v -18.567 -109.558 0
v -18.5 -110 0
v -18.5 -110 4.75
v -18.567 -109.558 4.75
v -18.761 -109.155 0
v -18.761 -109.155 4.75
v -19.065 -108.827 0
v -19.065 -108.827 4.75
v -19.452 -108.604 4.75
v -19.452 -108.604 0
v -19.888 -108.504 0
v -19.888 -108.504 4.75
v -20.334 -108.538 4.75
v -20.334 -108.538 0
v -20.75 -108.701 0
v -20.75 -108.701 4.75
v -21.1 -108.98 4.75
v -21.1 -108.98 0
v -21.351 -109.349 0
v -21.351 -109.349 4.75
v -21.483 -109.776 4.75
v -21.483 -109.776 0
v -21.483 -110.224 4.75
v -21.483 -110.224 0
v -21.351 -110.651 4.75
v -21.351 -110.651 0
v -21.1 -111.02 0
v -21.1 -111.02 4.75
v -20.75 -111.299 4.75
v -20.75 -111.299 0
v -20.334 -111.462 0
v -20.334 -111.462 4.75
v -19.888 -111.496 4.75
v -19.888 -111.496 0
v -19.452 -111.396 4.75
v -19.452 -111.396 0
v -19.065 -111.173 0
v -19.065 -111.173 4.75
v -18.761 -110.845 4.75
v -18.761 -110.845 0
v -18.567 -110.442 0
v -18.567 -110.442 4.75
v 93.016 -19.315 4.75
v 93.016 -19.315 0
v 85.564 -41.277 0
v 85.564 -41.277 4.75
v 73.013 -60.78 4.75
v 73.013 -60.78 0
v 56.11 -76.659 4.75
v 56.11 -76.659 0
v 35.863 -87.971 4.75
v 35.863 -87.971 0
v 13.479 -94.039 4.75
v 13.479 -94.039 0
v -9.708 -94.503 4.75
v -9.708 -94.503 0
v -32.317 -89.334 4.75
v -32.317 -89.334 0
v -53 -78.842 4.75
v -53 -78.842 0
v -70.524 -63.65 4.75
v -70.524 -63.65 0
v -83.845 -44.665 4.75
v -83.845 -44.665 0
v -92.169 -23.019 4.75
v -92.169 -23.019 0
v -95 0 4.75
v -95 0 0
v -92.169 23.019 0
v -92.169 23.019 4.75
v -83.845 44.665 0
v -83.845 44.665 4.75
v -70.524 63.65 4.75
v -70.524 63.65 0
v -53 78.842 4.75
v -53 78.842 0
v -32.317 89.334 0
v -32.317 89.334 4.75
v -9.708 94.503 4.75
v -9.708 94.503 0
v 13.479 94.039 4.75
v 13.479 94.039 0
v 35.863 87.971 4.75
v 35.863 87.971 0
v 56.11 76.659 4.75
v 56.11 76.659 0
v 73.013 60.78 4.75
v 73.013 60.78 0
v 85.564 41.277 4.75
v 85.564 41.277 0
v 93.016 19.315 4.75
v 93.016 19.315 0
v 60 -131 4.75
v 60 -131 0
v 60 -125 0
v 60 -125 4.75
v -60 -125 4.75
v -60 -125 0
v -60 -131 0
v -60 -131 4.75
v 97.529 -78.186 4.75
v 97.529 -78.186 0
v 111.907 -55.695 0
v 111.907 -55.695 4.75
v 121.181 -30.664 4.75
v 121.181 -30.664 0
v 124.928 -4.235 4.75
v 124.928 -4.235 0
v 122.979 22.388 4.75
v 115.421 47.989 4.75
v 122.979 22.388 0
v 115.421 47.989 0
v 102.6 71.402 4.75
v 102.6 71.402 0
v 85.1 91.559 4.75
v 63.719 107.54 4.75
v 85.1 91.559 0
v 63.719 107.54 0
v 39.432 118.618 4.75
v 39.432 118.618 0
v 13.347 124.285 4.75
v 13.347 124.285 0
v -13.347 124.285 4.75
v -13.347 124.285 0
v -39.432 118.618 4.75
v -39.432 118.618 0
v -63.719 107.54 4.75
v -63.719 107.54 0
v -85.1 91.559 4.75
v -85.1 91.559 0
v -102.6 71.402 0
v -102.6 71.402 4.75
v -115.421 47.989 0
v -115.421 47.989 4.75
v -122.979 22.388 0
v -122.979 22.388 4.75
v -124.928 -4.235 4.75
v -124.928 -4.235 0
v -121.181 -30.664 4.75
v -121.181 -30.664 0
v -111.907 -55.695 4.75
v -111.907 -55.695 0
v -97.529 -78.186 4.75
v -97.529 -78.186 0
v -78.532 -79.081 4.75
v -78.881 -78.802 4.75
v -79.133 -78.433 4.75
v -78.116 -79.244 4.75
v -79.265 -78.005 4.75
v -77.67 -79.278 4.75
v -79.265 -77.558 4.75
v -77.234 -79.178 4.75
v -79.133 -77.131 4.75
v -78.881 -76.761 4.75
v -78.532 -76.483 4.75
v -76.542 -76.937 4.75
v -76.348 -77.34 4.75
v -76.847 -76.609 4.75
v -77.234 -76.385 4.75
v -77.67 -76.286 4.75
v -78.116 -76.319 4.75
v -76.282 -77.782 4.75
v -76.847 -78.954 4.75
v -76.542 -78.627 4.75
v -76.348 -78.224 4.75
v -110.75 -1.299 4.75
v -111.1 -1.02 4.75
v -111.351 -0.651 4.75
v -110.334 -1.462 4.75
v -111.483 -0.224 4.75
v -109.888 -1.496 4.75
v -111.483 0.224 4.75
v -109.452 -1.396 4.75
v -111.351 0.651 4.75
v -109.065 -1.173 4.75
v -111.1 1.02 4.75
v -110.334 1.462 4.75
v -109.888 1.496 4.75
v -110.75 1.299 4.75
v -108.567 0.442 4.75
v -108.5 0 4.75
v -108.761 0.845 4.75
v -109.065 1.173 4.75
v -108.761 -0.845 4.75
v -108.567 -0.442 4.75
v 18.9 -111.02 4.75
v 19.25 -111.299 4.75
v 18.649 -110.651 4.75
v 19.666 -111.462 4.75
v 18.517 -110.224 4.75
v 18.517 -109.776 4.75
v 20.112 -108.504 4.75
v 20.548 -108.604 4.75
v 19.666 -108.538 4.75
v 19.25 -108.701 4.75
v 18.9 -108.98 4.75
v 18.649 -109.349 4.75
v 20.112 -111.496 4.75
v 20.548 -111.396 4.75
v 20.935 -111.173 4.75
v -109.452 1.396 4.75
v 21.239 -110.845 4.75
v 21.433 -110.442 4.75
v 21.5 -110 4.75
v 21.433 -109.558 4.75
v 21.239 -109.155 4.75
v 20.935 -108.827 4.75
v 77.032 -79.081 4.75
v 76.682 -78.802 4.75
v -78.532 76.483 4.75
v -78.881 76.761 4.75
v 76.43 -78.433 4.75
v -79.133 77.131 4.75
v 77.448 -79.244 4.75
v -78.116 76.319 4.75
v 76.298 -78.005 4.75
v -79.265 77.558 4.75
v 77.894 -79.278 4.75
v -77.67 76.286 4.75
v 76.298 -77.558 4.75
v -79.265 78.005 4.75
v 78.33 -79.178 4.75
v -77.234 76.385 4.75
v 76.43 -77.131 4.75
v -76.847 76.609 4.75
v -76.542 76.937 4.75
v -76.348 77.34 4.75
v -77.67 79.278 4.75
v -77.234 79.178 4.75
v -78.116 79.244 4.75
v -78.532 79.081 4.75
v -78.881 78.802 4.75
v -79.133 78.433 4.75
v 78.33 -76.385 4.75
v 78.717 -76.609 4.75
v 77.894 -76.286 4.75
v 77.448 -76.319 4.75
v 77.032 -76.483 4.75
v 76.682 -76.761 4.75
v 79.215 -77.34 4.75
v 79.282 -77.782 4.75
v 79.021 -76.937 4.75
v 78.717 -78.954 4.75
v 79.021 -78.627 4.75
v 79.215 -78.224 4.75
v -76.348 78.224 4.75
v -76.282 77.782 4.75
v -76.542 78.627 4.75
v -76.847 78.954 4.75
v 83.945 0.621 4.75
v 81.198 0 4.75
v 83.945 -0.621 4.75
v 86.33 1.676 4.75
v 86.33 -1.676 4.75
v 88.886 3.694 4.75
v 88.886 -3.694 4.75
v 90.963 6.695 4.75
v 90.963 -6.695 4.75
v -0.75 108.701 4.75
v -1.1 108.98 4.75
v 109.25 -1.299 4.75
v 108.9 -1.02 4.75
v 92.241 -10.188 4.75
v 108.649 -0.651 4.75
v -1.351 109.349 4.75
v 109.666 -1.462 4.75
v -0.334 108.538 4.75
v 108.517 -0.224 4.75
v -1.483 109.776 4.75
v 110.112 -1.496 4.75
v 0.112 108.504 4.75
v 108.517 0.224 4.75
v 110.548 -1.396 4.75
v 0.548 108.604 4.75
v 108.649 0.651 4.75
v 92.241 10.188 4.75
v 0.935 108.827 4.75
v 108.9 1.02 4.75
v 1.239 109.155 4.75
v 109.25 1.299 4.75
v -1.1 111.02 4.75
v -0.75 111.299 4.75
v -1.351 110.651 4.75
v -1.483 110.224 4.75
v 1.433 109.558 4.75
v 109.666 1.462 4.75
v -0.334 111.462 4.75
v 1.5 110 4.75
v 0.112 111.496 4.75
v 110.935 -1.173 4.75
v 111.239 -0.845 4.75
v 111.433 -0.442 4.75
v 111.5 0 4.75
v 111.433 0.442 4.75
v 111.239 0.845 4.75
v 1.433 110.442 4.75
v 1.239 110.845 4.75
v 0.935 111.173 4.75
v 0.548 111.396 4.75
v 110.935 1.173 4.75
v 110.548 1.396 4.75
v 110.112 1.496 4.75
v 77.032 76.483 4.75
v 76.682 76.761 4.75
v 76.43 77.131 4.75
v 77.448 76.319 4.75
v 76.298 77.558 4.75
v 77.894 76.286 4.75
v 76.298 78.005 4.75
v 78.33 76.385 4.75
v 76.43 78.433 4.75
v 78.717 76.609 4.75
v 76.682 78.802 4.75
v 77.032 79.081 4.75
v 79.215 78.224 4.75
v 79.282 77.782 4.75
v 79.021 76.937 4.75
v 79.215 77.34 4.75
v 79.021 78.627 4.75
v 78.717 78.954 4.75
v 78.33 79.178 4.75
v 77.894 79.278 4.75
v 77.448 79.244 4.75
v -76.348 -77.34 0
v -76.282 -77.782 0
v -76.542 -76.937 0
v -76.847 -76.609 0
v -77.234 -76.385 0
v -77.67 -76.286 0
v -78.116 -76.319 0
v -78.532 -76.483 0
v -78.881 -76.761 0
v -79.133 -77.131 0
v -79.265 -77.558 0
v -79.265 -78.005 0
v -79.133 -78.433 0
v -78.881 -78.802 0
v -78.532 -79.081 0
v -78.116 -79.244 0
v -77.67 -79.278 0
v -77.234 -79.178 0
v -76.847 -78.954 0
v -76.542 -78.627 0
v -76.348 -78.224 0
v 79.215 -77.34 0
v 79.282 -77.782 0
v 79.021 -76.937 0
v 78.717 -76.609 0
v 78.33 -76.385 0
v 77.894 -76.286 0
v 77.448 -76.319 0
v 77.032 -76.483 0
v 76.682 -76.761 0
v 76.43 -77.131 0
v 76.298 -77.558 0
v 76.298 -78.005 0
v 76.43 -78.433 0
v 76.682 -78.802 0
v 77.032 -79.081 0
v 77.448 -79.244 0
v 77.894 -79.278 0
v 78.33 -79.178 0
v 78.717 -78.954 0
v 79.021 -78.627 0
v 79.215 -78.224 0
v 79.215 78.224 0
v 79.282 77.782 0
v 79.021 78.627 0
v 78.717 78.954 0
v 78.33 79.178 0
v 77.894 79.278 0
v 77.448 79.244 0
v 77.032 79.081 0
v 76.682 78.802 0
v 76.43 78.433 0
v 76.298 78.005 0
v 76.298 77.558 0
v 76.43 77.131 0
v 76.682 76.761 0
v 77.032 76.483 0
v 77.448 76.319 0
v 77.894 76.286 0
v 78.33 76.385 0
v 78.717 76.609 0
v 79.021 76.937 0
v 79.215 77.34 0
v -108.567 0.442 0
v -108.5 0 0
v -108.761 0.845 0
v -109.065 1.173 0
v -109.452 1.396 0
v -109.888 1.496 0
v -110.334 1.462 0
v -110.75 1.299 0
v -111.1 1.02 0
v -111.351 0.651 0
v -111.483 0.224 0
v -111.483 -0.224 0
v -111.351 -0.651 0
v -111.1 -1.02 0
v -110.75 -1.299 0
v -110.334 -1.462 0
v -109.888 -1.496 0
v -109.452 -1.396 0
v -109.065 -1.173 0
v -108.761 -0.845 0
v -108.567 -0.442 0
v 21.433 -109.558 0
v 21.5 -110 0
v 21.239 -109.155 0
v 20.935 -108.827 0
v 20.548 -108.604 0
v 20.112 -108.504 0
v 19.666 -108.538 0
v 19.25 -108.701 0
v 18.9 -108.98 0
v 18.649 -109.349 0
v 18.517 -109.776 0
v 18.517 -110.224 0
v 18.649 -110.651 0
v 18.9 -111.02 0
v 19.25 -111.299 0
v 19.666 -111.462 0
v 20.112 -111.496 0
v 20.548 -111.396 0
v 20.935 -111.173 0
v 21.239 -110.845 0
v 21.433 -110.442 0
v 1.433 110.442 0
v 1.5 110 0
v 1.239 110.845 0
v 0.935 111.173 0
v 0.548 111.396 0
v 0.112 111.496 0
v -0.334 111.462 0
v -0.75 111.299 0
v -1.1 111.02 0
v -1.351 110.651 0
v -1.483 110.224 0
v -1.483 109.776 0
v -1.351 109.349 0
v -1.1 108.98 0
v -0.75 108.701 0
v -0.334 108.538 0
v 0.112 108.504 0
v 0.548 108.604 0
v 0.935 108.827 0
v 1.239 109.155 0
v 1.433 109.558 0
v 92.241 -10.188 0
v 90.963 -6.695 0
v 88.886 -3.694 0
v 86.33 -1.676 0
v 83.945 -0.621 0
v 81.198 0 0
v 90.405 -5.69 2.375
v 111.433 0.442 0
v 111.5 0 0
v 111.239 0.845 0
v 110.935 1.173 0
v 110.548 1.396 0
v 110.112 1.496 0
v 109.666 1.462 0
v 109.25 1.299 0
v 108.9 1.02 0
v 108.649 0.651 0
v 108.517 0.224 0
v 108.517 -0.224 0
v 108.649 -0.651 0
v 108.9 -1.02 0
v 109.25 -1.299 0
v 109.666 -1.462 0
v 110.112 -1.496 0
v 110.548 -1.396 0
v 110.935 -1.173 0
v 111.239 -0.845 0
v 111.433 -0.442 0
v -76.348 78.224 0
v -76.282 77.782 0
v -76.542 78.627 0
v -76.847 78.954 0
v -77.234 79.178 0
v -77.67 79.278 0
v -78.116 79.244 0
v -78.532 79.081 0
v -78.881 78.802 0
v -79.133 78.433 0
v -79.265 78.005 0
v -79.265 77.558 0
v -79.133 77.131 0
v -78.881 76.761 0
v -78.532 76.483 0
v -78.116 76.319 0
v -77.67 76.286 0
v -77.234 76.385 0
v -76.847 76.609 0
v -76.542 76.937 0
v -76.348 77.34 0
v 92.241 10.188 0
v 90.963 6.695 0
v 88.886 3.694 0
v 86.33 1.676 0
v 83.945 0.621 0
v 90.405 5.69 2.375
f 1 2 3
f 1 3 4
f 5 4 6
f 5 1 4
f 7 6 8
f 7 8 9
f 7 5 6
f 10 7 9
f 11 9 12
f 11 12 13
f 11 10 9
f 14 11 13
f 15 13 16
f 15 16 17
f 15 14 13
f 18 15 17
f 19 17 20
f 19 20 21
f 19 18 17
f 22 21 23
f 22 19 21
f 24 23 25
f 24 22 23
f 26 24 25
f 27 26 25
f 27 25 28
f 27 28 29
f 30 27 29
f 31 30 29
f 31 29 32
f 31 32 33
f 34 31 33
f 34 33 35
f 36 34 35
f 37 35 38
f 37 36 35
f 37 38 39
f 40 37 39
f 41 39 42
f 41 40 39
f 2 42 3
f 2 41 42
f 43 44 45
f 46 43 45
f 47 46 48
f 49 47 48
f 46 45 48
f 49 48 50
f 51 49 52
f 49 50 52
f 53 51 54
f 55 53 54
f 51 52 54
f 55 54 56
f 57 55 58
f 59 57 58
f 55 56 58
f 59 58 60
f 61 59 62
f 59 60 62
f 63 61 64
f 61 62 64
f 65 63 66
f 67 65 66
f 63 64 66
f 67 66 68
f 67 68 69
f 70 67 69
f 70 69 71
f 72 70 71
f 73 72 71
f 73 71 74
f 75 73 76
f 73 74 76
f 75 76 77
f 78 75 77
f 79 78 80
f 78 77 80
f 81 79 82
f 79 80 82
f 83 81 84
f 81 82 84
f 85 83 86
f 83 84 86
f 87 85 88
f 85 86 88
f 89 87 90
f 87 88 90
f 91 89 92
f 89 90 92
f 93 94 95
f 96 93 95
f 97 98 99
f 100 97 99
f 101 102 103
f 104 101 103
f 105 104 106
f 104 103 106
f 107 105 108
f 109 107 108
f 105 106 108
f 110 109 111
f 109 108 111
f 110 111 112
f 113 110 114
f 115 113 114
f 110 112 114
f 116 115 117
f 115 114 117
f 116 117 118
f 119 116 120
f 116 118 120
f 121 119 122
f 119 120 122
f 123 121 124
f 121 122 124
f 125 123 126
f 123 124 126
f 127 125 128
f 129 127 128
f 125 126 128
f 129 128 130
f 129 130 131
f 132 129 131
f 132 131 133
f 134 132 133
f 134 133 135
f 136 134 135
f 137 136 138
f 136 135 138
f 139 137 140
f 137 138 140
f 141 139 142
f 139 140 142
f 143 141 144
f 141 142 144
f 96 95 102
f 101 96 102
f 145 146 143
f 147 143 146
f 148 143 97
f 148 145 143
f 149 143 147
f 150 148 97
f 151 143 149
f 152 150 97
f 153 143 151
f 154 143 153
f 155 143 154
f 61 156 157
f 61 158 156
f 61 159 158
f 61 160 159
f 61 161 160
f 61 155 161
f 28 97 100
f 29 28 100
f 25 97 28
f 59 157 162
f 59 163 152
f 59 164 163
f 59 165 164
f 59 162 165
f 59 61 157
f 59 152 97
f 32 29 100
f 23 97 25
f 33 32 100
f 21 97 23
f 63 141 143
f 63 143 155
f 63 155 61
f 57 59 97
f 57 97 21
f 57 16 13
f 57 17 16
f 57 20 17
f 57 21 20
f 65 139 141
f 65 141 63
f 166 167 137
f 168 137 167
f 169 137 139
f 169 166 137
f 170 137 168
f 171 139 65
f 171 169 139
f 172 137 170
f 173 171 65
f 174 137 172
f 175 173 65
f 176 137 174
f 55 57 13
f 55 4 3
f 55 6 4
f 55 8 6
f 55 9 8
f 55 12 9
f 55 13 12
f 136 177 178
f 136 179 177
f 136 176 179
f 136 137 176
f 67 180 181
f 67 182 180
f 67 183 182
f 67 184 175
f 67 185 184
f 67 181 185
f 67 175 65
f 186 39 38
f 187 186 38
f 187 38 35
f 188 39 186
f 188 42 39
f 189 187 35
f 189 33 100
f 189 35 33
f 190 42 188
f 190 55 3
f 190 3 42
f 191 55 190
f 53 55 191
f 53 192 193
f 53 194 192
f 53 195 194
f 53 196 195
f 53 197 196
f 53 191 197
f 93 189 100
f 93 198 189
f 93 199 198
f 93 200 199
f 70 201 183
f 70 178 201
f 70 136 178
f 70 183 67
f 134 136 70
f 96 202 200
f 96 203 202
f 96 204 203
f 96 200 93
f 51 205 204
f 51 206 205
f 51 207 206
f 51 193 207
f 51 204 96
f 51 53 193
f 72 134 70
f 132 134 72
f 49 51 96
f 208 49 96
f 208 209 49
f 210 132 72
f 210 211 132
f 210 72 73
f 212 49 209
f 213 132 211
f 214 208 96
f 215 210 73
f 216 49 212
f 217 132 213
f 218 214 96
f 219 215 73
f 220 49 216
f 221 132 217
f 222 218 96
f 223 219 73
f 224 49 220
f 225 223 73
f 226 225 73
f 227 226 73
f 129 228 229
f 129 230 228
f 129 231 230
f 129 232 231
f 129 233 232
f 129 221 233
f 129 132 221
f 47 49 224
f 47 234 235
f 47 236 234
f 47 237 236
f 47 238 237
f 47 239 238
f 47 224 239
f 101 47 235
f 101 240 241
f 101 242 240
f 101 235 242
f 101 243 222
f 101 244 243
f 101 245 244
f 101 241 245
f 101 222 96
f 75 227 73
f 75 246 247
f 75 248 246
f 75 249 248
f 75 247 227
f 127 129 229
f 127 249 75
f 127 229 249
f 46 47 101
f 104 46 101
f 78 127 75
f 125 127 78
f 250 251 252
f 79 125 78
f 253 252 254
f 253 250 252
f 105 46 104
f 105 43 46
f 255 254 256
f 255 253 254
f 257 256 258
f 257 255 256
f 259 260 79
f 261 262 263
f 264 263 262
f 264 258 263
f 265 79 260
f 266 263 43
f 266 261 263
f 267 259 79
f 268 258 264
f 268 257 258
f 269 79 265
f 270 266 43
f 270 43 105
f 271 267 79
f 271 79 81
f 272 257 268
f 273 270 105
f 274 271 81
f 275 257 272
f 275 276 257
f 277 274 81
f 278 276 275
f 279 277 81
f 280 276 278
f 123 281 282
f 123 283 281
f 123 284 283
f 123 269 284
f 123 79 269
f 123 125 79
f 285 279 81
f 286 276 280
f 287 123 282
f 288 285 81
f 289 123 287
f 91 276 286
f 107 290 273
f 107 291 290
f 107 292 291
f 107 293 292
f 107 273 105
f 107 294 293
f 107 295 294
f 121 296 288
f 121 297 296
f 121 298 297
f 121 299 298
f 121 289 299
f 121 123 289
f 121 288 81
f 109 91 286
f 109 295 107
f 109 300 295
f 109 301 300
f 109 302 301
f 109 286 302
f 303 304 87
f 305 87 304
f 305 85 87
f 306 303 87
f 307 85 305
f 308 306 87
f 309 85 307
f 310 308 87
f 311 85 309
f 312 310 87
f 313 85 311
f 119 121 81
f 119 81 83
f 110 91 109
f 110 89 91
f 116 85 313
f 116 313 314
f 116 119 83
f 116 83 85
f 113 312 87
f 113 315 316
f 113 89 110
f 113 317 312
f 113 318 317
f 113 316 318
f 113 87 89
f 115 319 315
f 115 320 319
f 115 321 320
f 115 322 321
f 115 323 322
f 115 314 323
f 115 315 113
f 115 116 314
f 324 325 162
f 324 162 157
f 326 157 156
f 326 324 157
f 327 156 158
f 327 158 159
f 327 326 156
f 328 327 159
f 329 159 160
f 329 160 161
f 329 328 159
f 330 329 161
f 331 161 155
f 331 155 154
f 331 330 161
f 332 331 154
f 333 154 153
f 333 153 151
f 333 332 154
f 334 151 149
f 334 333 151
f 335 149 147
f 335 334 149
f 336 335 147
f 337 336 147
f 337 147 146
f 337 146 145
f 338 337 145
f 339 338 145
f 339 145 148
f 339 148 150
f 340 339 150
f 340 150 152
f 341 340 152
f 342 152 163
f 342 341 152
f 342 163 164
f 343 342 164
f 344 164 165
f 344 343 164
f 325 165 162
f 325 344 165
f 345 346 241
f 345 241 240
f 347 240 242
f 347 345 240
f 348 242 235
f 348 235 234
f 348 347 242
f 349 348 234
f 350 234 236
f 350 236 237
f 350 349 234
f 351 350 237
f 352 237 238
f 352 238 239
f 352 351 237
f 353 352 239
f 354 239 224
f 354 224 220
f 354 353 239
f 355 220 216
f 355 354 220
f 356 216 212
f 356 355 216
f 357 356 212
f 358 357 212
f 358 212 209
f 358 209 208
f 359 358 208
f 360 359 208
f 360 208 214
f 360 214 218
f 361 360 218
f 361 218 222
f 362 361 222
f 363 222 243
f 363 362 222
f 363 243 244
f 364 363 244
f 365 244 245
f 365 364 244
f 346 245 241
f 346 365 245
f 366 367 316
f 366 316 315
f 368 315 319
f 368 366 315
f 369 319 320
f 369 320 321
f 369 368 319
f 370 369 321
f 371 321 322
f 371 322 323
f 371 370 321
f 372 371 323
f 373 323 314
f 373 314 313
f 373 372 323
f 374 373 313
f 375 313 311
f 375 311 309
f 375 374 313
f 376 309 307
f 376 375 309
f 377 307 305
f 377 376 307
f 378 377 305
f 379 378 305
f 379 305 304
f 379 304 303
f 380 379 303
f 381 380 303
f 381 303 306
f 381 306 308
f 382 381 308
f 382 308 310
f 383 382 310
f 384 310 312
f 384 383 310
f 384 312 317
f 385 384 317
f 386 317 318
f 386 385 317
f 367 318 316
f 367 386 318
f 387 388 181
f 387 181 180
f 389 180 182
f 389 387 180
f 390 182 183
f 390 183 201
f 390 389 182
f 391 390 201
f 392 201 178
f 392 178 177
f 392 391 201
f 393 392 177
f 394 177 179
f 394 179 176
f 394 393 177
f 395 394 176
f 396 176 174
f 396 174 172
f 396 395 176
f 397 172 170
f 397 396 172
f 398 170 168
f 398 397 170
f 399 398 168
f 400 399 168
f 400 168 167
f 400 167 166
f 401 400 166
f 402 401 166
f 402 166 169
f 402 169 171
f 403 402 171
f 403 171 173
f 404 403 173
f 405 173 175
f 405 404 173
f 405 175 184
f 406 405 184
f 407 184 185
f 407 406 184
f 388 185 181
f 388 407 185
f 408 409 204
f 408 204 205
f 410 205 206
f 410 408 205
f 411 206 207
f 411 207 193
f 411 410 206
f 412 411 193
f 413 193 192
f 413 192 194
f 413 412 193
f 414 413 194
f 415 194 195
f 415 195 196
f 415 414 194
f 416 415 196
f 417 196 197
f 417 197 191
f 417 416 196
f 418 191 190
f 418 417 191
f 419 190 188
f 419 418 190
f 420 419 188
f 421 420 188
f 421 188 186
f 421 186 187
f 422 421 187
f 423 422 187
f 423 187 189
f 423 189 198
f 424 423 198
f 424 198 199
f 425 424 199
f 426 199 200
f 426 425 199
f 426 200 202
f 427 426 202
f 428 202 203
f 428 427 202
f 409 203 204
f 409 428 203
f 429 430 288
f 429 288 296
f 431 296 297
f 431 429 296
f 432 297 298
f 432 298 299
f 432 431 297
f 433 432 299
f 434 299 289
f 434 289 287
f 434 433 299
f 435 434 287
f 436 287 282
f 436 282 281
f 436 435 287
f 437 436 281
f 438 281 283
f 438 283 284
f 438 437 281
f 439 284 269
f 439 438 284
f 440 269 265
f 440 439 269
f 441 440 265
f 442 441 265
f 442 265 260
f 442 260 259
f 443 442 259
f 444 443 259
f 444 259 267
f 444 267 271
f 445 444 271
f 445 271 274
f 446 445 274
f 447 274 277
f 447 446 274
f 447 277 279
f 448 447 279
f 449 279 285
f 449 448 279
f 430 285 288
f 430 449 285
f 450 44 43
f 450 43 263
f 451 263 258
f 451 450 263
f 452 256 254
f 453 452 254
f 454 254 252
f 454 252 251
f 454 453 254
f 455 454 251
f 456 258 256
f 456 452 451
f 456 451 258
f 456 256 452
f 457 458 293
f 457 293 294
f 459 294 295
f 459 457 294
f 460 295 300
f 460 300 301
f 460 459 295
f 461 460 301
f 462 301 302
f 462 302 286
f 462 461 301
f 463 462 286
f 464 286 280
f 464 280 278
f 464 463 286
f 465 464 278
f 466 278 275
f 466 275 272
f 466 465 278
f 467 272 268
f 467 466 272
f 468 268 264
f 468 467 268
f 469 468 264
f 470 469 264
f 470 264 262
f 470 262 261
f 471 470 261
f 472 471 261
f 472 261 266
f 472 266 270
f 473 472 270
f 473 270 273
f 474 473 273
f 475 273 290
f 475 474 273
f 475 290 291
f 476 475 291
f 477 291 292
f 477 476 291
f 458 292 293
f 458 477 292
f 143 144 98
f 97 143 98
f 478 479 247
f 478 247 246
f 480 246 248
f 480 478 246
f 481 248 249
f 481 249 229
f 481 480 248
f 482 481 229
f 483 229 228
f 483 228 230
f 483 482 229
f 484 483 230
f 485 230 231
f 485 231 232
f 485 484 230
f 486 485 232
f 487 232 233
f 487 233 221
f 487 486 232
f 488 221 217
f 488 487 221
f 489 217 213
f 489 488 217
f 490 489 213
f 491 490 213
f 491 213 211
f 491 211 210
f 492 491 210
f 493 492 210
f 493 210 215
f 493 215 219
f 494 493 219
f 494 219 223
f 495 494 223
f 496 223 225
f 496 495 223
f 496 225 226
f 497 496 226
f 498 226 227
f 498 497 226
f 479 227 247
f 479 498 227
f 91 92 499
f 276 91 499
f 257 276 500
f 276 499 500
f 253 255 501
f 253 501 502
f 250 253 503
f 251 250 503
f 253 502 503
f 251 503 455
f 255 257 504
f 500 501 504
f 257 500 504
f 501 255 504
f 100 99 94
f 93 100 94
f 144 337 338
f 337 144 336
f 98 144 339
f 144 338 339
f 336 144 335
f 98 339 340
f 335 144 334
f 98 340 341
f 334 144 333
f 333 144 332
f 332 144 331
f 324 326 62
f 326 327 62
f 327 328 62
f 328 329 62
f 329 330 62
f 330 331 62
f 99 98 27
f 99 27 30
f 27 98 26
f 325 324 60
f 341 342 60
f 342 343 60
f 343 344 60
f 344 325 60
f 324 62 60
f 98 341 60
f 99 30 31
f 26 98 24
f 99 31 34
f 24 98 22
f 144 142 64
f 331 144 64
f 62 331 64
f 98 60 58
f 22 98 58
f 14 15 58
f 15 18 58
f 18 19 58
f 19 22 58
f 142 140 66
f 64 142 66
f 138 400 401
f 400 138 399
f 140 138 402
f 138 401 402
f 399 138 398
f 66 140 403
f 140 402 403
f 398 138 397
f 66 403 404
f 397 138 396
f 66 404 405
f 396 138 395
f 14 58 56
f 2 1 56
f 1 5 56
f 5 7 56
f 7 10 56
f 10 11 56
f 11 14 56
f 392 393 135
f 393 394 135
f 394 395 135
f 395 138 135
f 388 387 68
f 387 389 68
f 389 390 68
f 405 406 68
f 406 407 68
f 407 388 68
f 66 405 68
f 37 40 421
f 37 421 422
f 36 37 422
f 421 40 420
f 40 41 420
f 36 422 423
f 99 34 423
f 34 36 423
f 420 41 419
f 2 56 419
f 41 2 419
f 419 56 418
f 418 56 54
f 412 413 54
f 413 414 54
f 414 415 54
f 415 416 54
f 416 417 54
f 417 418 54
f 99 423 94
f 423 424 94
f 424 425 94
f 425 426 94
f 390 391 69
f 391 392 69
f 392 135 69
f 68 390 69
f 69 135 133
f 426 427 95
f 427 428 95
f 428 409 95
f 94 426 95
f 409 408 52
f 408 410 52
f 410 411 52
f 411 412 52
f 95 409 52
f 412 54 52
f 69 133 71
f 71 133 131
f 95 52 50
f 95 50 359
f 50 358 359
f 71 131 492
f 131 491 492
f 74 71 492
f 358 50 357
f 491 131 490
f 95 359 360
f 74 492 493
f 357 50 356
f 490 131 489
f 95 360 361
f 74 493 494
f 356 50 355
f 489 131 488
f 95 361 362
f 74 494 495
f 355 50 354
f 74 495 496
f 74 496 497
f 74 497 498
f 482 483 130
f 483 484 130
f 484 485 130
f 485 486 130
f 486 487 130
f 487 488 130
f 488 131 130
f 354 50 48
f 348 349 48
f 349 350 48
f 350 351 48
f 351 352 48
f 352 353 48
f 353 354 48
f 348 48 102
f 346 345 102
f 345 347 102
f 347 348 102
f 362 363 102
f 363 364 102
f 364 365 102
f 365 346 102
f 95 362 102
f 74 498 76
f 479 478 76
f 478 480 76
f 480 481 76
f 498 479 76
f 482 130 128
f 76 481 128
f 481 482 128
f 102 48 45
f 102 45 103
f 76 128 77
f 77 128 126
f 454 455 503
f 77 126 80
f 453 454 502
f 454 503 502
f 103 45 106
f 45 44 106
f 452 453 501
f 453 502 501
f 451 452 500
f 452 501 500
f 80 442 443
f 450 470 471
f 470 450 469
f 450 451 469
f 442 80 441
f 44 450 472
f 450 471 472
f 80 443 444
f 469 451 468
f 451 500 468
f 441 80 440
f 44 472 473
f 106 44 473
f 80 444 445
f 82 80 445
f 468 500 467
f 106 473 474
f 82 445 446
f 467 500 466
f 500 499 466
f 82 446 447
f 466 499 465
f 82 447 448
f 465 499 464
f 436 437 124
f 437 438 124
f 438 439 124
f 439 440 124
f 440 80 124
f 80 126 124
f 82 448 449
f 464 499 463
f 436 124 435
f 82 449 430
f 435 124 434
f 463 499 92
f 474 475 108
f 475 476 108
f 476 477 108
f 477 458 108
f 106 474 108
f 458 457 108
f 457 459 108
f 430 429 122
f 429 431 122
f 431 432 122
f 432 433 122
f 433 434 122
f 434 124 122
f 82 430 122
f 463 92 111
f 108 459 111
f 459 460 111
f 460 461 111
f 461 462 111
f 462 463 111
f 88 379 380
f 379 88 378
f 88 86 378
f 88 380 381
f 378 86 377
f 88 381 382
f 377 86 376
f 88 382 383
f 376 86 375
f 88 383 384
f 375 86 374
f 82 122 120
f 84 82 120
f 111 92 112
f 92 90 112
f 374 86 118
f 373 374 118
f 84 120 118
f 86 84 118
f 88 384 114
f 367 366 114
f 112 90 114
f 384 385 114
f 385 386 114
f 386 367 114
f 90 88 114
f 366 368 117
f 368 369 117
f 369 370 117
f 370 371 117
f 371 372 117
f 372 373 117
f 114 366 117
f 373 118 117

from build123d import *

# Parameters (mm, degrees)
SKETCH1_R           = 1.5
BOSS_EXTRUDE1_DEPTH = 4.75


with BuildPart() as part:
    # Sketch1 → Boss-Extrude1 (new body)
    with BuildSketch(Plane.XY):
        with BuildLine():
            Line((-97.529258778, -78.185955787), (-60, -125))
            Line((-60, -125), (-60, -131))
            Line((-60, -131), (60, -131))
            Line((60, -131), (60, -125))
            Line((60, -125), (97.529258778, -78.185955787))
            ThreePointArc((97.529258778, -78.185955787), (0, 125), (-97.529258778, -78.185955787))
        make_face()
        with Locations((-77.781745931, -77.781745931)):
            Circle(SKETCH1_R, mode=Mode.SUBTRACT)
        with Locations((-20, -110)):
            Circle(SKETCH1_R, mode=Mode.SUBTRACT)
        with Locations((20, -110)):
            Circle(SKETCH1_R, mode=Mode.SUBTRACT)
        with Locations((77.781745931, -77.781745931)):
            Circle(SKETCH1_R, mode=Mode.SUBTRACT)
        with Locations((-110, 0)):
            Circle(SKETCH1_R, mode=Mode.SUBTRACT)
        with BuildLine():
            ThreePointArc((93.01577046, -19.314928054), (-95, 0), (93.01577046, 19.314928054))
            add(Edge.make_bspline(
                [(93.01577046, 19.314928054), (93.70285757, 1.722452045), (81.198007465, 0)],
                knots=[0, 0, 0, 1, 1, 1], degree=2))
            add(Edge.make_bspline(
                [(93.01577046, -19.314928054), (93.70285757, -1.722452045), (81.198007465, 0)],
                knots=[0, 0, 0, 1, 1, 1], degree=2))
        make_face(mode=Mode.SUBTRACT)
        with Locations((-77.781745931, 77.781745931)):
            Circle(SKETCH1_R, mode=Mode.SUBTRACT)
        with Locations((110, 0)):
            Circle(SKETCH1_R, mode=Mode.SUBTRACT)
        with Locations((0, 110)):
            Circle(SKETCH1_R, mode=Mode.SUBTRACT)
        with Locations((77.781745931, 77.781745931)):
            Circle(SKETCH1_R, mode=Mode.SUBTRACT)
    extrude(amount=BOSS_EXTRUDE1_DEPTH)


solid = part.part
